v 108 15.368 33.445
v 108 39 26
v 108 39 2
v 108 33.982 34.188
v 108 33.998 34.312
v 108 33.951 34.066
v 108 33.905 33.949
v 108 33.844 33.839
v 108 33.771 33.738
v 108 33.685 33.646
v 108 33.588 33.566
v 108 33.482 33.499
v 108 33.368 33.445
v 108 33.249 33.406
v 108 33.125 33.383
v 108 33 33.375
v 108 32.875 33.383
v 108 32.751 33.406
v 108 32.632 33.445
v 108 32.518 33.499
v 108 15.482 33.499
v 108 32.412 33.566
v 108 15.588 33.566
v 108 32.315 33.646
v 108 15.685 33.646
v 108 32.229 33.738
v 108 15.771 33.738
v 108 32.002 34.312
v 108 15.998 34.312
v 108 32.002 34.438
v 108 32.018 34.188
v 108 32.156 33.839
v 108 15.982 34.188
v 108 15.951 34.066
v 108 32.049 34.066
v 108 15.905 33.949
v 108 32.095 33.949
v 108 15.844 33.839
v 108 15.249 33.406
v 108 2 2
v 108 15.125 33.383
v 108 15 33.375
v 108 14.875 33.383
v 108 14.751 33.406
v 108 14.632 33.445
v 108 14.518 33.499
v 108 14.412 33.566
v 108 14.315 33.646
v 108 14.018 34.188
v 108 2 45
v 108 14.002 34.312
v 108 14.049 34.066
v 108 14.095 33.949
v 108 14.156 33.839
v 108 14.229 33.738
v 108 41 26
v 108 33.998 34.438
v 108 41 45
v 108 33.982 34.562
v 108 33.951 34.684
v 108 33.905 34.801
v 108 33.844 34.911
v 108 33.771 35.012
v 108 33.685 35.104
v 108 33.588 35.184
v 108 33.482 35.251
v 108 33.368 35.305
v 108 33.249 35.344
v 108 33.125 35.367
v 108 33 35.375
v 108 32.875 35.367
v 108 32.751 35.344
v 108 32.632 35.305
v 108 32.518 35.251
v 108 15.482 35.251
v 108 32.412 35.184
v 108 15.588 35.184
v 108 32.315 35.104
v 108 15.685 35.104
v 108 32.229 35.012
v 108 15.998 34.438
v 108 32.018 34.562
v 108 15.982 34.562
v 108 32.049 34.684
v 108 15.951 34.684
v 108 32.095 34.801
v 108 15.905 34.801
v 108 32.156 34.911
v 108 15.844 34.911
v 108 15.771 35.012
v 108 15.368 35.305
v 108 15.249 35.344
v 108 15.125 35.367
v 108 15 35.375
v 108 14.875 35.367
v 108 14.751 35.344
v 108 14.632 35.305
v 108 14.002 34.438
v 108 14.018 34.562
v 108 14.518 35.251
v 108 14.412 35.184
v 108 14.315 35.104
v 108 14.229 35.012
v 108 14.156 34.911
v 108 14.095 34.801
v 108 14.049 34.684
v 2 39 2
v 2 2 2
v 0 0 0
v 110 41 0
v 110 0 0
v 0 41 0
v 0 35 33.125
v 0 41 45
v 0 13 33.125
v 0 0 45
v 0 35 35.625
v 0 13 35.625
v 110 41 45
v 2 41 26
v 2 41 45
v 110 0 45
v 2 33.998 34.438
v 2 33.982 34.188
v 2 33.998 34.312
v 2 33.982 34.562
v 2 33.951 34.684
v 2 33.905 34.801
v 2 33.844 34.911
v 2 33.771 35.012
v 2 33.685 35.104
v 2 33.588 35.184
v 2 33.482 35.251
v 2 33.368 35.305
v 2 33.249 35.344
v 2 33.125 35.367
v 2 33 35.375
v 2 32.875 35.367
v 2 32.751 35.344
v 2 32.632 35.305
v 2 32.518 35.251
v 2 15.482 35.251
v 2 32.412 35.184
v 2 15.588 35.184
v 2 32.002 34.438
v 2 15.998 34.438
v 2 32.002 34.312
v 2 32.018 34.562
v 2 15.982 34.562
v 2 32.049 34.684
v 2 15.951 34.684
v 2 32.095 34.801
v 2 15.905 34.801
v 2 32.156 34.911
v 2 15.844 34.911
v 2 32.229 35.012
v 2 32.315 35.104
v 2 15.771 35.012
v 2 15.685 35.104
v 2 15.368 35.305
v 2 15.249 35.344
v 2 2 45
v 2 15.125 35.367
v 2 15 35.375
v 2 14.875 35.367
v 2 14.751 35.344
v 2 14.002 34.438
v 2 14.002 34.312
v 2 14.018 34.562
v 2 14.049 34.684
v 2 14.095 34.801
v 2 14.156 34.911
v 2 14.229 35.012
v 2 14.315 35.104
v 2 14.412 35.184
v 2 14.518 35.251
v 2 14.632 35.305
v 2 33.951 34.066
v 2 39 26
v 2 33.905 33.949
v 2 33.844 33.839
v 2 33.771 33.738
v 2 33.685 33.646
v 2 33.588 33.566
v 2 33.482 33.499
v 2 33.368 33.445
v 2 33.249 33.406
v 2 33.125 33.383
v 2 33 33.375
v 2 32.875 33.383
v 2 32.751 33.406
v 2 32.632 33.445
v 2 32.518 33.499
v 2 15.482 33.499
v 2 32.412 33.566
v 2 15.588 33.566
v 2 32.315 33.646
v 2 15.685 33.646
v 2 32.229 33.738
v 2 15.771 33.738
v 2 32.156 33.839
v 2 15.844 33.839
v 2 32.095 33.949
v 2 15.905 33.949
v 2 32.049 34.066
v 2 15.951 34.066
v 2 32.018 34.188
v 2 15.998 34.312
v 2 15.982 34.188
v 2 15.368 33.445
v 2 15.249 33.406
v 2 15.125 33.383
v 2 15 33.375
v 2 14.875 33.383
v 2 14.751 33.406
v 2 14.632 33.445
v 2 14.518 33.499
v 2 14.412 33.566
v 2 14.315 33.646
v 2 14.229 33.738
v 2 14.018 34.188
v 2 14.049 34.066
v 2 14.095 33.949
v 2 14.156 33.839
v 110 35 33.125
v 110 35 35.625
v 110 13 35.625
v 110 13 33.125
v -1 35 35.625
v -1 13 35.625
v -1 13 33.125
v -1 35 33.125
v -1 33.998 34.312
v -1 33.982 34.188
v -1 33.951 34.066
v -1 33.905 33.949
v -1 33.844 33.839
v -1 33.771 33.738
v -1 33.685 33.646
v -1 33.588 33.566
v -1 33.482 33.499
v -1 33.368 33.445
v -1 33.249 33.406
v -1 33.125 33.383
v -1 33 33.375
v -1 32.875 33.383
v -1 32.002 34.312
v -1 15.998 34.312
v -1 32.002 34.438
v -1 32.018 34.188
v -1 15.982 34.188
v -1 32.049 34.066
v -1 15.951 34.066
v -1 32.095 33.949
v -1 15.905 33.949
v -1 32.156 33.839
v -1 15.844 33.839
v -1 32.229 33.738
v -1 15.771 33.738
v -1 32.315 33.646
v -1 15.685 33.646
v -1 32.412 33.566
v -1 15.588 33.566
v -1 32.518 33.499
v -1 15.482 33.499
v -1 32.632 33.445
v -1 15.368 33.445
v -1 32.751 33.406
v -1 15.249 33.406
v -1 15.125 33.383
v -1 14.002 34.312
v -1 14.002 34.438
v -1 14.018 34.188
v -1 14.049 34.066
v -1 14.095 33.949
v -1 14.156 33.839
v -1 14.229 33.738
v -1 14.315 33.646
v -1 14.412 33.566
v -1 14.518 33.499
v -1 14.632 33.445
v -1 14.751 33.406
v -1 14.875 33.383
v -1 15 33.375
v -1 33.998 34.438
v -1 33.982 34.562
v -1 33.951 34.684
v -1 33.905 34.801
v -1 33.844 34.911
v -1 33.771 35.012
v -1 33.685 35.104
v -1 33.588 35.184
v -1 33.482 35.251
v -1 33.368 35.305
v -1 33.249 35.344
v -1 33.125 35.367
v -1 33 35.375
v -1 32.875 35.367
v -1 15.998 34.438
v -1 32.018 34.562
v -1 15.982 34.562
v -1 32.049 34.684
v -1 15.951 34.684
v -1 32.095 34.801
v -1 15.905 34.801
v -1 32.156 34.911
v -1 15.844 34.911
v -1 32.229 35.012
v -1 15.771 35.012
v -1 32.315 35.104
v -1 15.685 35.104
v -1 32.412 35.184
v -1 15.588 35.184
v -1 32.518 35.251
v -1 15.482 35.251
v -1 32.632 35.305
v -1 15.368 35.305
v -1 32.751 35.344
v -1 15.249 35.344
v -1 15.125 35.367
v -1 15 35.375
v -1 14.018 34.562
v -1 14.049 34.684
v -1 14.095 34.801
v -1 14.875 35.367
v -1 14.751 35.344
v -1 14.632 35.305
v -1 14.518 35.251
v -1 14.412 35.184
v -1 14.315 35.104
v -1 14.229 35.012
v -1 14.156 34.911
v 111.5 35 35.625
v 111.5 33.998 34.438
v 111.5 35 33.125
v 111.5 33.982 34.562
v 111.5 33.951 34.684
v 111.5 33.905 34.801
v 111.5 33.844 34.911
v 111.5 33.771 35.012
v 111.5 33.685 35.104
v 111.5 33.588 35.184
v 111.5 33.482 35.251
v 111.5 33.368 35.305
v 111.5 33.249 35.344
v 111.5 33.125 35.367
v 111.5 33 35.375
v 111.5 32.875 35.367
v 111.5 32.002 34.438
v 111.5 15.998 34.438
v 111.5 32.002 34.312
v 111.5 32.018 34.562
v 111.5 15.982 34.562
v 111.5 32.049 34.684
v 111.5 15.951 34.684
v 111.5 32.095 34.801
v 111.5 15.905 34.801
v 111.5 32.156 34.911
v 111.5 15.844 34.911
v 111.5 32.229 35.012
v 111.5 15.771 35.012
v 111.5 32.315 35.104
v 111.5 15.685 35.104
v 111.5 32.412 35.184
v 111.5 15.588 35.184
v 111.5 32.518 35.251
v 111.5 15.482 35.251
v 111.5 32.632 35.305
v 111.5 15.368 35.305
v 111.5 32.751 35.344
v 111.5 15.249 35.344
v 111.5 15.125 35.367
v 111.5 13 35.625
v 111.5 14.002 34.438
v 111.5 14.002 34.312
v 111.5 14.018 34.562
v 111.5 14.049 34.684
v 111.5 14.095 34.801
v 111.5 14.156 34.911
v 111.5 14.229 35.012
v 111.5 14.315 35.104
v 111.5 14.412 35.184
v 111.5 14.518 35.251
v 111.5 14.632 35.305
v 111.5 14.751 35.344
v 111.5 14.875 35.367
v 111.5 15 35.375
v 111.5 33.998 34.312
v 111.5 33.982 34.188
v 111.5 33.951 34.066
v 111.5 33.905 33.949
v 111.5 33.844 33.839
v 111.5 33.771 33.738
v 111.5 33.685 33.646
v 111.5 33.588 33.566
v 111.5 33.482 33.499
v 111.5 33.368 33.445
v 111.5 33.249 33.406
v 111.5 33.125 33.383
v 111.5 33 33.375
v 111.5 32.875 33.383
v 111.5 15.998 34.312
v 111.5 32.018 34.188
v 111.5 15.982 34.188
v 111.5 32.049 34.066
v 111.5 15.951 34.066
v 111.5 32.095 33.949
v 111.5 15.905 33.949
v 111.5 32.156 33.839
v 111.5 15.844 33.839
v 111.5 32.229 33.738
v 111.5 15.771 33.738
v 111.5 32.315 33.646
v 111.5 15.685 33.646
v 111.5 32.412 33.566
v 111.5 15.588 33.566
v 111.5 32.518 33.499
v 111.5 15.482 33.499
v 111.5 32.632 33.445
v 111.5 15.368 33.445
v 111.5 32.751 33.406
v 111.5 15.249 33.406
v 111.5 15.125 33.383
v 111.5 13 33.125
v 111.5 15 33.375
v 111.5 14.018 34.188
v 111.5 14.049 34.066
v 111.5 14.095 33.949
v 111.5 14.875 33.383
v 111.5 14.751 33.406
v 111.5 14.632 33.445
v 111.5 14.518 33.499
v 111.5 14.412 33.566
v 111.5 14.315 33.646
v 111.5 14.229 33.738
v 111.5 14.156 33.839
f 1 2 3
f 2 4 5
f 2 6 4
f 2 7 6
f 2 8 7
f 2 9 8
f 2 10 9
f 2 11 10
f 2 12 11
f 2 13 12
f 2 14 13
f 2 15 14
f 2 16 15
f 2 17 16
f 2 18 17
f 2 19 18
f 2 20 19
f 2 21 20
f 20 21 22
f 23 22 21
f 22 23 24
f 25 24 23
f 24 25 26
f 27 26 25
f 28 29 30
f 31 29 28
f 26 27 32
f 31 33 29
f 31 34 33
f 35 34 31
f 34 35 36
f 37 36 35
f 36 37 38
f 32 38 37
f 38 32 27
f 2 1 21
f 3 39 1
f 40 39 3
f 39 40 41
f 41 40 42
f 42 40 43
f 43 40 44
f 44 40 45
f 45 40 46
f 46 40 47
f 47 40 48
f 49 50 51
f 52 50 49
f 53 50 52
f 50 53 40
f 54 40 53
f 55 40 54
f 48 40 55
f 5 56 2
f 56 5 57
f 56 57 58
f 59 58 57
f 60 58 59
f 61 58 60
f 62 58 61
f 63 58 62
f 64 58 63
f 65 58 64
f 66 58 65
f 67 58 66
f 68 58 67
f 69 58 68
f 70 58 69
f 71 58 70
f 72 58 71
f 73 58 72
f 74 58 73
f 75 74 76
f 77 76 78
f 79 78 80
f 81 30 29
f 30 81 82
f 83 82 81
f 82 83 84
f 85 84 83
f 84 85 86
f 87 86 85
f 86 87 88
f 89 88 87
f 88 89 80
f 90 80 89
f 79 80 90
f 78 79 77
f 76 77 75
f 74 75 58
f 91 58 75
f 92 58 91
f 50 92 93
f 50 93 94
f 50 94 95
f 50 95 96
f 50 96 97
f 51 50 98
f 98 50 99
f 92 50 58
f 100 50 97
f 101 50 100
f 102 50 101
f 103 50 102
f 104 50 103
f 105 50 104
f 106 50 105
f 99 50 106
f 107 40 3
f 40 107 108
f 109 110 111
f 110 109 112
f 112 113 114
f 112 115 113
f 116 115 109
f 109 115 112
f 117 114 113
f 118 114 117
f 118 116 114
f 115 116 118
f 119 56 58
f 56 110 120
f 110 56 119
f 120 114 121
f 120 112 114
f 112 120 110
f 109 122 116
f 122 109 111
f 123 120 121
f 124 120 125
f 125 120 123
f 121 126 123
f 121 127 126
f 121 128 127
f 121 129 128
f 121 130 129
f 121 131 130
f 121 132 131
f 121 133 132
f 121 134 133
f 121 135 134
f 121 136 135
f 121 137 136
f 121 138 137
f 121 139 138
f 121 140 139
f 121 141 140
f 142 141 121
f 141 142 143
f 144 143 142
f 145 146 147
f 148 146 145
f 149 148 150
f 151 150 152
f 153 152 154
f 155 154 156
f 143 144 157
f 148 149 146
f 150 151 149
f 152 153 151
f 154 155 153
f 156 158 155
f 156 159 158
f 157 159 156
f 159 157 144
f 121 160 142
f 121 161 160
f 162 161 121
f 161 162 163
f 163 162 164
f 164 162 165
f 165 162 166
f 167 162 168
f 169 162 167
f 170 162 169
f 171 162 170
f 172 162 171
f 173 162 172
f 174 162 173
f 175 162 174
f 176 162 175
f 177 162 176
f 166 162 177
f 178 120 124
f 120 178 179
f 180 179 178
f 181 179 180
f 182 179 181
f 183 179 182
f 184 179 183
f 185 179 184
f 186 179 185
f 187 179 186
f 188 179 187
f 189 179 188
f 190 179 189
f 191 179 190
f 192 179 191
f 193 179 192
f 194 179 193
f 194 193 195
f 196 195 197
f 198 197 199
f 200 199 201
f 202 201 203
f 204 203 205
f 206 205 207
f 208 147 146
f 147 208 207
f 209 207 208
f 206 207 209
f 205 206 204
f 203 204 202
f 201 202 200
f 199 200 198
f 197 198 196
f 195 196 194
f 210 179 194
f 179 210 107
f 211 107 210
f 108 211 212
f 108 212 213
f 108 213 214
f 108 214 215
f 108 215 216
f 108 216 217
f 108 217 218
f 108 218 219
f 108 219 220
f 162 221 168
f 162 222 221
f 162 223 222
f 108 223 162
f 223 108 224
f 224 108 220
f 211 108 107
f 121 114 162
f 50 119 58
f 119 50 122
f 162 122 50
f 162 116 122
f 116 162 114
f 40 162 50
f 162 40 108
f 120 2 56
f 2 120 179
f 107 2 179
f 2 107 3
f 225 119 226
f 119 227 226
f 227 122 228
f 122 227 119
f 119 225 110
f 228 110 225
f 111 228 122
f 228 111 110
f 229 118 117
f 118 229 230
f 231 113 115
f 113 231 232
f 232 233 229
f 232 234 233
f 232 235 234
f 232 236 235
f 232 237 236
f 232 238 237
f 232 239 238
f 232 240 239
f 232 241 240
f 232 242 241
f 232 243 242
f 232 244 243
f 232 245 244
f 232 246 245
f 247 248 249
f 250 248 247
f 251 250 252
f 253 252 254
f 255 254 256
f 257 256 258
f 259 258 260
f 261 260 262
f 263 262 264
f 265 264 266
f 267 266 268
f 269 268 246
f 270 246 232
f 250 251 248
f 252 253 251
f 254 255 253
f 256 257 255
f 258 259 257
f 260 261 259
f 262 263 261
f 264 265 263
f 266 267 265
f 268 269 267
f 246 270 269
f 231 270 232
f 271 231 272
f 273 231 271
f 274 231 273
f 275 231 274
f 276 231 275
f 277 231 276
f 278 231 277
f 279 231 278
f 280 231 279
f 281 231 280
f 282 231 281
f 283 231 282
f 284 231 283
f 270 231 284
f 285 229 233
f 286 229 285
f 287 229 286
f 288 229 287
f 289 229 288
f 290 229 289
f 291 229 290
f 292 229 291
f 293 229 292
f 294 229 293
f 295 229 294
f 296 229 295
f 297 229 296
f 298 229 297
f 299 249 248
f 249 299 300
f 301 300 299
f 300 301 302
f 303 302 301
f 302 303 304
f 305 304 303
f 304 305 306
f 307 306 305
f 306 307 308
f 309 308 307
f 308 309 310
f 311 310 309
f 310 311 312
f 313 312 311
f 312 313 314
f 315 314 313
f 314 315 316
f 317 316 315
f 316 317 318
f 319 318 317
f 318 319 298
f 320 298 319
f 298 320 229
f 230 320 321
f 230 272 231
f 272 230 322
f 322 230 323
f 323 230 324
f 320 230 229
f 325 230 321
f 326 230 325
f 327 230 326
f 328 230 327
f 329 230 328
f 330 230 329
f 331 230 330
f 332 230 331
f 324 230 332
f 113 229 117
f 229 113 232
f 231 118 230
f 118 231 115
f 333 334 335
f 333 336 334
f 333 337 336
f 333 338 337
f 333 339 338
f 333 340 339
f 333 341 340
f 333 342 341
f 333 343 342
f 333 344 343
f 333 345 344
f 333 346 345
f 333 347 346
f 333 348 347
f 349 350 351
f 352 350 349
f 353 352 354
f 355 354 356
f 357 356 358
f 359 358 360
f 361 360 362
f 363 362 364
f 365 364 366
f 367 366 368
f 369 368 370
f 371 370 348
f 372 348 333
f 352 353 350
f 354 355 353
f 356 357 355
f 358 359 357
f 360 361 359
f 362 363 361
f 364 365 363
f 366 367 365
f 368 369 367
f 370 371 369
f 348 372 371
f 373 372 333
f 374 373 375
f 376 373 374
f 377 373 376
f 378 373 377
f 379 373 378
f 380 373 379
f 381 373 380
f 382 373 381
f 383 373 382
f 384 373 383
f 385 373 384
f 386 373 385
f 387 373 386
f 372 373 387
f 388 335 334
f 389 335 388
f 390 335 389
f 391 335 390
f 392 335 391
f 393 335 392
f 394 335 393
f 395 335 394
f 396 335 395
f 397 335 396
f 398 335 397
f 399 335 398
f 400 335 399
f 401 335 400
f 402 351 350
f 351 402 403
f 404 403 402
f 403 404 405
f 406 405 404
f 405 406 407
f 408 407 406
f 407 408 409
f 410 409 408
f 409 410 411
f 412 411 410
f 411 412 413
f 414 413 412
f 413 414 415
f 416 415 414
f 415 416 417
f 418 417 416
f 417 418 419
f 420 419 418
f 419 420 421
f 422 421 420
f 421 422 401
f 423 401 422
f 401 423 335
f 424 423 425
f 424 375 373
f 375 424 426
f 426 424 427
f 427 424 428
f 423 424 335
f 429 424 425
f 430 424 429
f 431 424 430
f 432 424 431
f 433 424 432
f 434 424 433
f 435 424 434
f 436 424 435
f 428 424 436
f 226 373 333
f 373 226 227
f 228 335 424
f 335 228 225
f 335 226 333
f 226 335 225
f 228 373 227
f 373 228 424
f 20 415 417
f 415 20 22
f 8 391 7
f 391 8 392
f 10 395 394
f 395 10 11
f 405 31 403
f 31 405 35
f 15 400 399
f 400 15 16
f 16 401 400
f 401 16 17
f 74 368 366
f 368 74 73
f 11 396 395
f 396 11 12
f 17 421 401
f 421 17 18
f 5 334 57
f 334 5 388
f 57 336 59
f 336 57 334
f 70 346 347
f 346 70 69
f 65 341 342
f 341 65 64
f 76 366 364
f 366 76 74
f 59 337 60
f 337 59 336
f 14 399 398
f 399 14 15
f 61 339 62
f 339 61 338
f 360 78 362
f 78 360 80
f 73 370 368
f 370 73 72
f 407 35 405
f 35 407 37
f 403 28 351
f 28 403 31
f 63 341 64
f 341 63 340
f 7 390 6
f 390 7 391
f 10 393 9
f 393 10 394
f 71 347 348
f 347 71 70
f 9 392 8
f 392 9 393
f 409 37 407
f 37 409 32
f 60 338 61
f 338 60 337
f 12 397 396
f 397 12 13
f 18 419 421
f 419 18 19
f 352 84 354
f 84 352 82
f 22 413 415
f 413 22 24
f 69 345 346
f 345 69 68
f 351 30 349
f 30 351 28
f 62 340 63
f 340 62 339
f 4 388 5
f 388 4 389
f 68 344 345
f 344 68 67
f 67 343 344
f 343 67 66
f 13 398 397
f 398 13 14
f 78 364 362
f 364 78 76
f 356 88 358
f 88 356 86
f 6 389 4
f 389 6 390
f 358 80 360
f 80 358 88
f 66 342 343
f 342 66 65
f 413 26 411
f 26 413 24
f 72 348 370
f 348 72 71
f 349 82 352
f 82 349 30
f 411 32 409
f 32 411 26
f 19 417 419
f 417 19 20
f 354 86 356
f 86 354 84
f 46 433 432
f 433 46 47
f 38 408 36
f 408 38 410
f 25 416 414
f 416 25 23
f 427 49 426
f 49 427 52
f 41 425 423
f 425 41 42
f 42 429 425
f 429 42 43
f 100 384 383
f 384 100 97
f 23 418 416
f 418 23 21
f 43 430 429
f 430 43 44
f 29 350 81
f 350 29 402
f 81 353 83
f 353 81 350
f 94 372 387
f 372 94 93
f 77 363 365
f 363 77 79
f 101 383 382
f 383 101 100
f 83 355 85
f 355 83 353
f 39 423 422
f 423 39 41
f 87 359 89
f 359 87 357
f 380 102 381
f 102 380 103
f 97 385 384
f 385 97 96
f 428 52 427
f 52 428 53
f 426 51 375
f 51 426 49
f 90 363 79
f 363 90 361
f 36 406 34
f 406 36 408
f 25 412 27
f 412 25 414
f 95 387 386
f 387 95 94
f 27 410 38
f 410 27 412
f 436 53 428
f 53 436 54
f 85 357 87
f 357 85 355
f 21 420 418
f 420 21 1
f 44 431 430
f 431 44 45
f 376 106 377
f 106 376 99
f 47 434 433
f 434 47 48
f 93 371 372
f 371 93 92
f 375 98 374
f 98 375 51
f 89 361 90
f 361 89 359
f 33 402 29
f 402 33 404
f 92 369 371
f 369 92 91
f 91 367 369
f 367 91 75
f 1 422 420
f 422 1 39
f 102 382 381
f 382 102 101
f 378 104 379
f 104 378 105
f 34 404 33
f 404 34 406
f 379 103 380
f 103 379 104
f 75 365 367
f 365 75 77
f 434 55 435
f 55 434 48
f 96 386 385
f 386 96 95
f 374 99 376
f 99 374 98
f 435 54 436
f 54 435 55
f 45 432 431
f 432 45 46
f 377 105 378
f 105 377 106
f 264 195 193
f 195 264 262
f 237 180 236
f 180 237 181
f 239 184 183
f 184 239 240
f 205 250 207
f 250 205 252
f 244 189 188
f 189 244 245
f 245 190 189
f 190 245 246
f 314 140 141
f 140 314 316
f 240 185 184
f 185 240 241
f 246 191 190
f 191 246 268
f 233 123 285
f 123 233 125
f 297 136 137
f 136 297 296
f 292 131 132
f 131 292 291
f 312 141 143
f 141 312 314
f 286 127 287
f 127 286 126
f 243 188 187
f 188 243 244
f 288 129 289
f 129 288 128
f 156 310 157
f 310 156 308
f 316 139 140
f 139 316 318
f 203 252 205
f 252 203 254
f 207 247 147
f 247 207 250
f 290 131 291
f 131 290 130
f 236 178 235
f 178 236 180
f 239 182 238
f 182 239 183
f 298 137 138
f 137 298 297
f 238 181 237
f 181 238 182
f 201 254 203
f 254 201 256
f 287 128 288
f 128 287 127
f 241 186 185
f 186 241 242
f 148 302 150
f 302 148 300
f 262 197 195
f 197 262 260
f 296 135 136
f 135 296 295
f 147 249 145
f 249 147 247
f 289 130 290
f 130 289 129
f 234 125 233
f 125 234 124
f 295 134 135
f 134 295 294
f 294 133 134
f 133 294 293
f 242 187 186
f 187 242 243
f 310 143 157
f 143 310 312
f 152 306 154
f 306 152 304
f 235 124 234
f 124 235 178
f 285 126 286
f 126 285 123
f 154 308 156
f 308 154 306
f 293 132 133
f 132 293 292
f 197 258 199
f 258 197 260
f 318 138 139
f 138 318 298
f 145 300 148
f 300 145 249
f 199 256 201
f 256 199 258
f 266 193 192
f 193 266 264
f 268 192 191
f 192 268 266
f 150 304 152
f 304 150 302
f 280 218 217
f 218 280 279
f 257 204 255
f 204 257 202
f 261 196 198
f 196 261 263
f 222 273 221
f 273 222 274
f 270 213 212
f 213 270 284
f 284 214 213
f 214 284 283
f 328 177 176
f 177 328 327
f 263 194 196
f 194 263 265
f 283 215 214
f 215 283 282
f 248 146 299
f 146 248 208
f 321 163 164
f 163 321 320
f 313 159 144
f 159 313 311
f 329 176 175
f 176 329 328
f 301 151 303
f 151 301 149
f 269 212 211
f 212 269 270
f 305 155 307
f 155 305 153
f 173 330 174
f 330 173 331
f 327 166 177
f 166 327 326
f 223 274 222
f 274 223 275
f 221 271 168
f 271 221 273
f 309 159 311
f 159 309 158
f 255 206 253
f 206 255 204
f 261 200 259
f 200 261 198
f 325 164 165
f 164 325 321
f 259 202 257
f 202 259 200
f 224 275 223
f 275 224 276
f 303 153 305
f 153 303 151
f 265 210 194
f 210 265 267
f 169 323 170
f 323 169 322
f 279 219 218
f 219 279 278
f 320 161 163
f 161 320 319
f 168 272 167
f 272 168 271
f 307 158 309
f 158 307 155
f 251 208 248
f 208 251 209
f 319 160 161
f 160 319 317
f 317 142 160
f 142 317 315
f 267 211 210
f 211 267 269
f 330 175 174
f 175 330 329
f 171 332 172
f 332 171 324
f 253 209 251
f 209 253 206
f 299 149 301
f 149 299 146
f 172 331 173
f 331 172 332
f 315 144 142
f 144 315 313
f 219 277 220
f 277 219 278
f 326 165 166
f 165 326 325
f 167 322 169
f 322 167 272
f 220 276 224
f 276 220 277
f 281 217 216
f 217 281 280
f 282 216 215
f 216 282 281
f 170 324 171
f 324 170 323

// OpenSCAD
/*************************************************************************************************
Power Supply Terminal Cover for the power supply commonly used with the Bukobot and other 3d printers
Author: Mike Thompson (thingiverse: mike_linus)
Date Last Modified: 11/03/2013 4:19pm
Description: simply change the cutout parameters to suit. Note: do not change length, height, depth and thickness parameters for the base unless you want to change the core dimensions.
**************************************************************************************************/

//***************************************************************
//don't change these base parameters unless you want to change the core dimensions.
//***************************************************************
hole_resolution=50;
base_length=108;
base_height=41;
base_depth=45;//dec
bottom_height = base_depth-19;
base_thickness=2;
slot_depth = 9;// distance from well back to the closer slot edge
slot_len = 22;// slot length not counting radius
slot_width = 2.75; // slot_width
slot_height = 6; //distance from folded over inner ps bottom (usually a folded over lip) to nearest slot end
retainer_width = 2.5; //width of the retainer (a bit less than the slot)

slot_cen = base_depth-slot_width/2-slot_depth-0.25;
$fn=hole_resolution;

//***************************************************************
//change these cutout parameters to suit you own switch size etc.
//***************************************************************
switch_cutout_length=27;
switch_cutout_width=12;

led_cutout_radius=4;
grommet_cutout_radius=6;

power_plug_cutout_length=28;
power_plug_cutout_width=20;

screw_hole_cutout_radius=1;





module base(){
cube([base_length,base_height,base_thickness]);
cube([base_thickness,base_height,base_depth]);
cube([base_length,base_thickness,base_depth]);
 if(bottom_height>0) translate ([0,base_height-base_thickness,0]) cube ([base_length,base_thickness,bottom_height]);//dec
translate([base_length,0,0])cube([base_thickness,base_height,base_depth]);
translate([-1,base_height-slot_len-slot_height,slot_cen-retainer_width/2])cube([1.5,slot_len,retainer_width]);//slot retainer //dec
translate([base_length+base_thickness,base_height-slot_len-slot_height,slot_cen-retainer_width/2])cube([1.5,slot_len,retainer_width]);//slot retainer  //dec
}



difference(){
base();
//translate([72,0,3])cube([switch_cutout_length,base_thickness,switch_cutout_width]);  //switch cutout //dec
//translate([8,3,9])rotate([90,0,0])cylinder(r=led_cutout_radius,h=5);  //led cutout//dec
//translate([60,20,0])cylinder(r=grommet_cutout_radius,h=5);  //12v lead cutout//dec
//translate([14,3,0])cube([power_plug_cutout_length,power_plug_cutout_width,base_thickness]);  //240v plug cutout//dec
//translate([7.5,12.75,0])cylinder(r=screw_hole_cutout_radius,h=5);  //240v plug screw hole//dec
//translate([48,12.75,0])cylinder(r=screw_hole_cutout_radius,h=5);  //240v plug screw hole//dec
translate([base_length,base_height-slot_height-2,slot_cen])rotate([0,90,0])cylinder(r=screw_hole_cutout_radius,h=5);  //retainer screw hole //dec
#translate([base_length,base_height-slot_len-slot_height+2,slot_cen])rotate([0,90,0])cylinder(r=screw_hole_cutout_radius,h=5);  //retainer screw hole //dec
translate([-1,base_height-slot_height-2,slot_cen])rotate([0,90,0])cylinder(r=screw_hole_cutout_radius,h=5);  //retainer screw hole //dec
translate([-1,base_height-slot_len-slot_height+2,slot_cen])rotate([0,90,0])cylinder(r=screw_hole_cutout_radius,h=5);  //retainer screw hole//d\ec
}







module uxcell_power_entry () {


	difference () {
		union () {
			radplate (xwid=30,ywid=50,thk=3,rad=3); //faceplate 
			translate([0,0,-21.5]) difference () {
				radplate (xwid=27.25,ywid=47.25,rad=3,thk=21.5); //simplified body, thickness includes connection tabs
				translate ([-sqrt(2)*4-17/2,47.25/2,0]) rotate ([0,0,45]) translate ([-4,-4,0]) cube ([8,8,21.5]);
				translate ([sqrt(2)*4+17/2,47.25/2,0]) rotate ([0,0,45]) translate ([-4,-4,0]) cube ([8,8,21.5]);		
			}
			translate ([0,-16,0]) rotate ([0,-15,0])cube ([16.4,10.4,8],center=true); //apx to the switch
				
		}			

		#scale ([.9,.9,1]) translate([0,0,-17.5]) difference () {
			translate ([0,15,0]) radplate (xwid=27.25,ywid=17.25,rad=3,thk=21.5); //changed the length of the body, shrunk and translated it depth of well in question
			translate ([-sqrt(2)*4-17/2,47.25/2,0]) rotate ([0,0,45]) translate ([-4,-4,0]) cube ([8,8,21.5]);
			translate ([sqrt(2)*4+17/2,47.25/2,0]) rotate ([0,0,45]) translate ([-4,-4,0]) cube ([8,8,21.5]);		
		}	
	}	
}
